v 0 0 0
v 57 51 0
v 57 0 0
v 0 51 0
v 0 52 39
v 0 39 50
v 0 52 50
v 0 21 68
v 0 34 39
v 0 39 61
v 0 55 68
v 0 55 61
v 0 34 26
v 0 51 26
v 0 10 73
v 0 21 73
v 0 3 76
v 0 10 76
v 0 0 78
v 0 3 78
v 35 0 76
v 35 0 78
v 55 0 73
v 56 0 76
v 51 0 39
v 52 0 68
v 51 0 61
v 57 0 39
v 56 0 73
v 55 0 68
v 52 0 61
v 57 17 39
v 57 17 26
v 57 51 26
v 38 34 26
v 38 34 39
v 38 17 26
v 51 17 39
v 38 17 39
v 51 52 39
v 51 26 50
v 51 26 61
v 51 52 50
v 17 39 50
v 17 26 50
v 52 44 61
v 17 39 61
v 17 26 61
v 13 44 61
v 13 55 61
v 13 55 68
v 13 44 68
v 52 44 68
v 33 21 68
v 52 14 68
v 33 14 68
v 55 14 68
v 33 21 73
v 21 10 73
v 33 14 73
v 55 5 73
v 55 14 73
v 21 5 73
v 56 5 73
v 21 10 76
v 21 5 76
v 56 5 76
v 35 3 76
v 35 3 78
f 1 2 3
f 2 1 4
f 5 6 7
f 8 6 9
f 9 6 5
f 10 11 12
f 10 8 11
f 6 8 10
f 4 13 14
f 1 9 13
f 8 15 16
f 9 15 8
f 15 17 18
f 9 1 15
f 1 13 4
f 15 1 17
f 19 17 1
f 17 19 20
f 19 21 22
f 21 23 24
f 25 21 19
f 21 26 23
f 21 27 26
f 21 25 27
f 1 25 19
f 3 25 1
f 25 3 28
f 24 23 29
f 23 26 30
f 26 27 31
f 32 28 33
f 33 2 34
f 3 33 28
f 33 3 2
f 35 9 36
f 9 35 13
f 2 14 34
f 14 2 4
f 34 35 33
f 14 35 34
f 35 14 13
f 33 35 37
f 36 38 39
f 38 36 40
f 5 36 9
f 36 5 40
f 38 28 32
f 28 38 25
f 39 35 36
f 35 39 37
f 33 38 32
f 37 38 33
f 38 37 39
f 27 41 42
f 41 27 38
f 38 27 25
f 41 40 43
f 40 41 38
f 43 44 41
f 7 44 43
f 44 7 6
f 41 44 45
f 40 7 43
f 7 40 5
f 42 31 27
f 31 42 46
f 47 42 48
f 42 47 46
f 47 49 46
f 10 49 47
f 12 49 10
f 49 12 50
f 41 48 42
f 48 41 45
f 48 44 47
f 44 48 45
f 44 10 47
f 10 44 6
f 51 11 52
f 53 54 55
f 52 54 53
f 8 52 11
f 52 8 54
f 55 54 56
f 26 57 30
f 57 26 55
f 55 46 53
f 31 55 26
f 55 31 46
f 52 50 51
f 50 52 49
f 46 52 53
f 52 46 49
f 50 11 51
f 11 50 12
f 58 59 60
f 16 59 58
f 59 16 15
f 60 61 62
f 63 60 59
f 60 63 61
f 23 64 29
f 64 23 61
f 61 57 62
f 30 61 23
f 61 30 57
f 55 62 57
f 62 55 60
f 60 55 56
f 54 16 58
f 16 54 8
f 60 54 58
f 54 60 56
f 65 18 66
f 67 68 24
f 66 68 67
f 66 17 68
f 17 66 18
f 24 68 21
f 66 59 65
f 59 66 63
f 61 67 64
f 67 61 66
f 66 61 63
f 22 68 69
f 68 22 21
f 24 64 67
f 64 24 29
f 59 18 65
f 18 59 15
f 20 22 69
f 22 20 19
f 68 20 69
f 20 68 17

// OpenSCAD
translate([9.5, 8.5, 6.5]) color([0.7783252161231047, 0.6735909267280185, 0.3798743247069636]) cube([19, 17, 13], center=true);
translate([28.5, 8.5, 6.5]) color([0.026441636821160075, 0.43626396781238774, 0.9136944836857255]) cube([19, 17, 13], center=true);
translate([47.5, 8.5, 6.5]) color([0.33292336546782575, 0.24795871915323087, 0.13783083382268813]) cube([19, 17, 13], center=true);
translate([9.5, 25.5, 6.5]) color([0.5102524550010475, 0.5333482727437294, 0.07304824240354912]) cube([19, 17, 13], center=true);
translate([28.5, 25.5, 6.5]) color([0.40775848601839615, 0.6586814548864428, 0.9660506851714608]) cube([19, 17, 13], center=true);
translate([47.5, 25.5, 6.5]) color([0.43154112171906467, 0.4360353368941353, 0.47113397256850664]) cube([19, 17, 13], center=true);
translate([9.5, 42.5, 6.5]) color([0.2250334912265638, 0.3948376420144343, 0.6452647259919572]) cube([19, 17, 13], center=true);
translate([28.5, 42.5, 6.5]) color([0.39705920905186254, 0.5813757484333044, 0.8355822879997544]) cube([19, 17, 13], center=true);
translate([47.5, 42.5, 6.5]) color([0.997967573075557, 0.8850396836294676, 0.3717966269131009]) cube([19, 17, 13], center=true);
translate([9.5, 8.5, 19.5]) color([0.02172713431740758, 0.6116045995026433, 0.4745507082101075]) cube([19, 17, 13], center=true);
translate([28.5, 8.5, 19.5]) color([0.23701711204858011, 0.040304099105049285, 0.3215702389727013]) cube([19, 17, 13], center=true);
translate([47.5, 8.5, 19.5]) color([0.7980713128356309, 0.9641190068878396, 0.10666013907247773]) cube([19, 17, 13], center=true);
translate([9.5, 25.5, 19.5]) color([0.8776394117814497, 0.04871767121707815, 0.7134758188756509]) cube([19, 17, 13], center=true);
translate([28.5, 25.5, 19.5]) color([0.026795713363172546, 0.4210496822819296, 0.8702308384812625]) cube([19, 17, 13], center=true);
translate([47.5, 25.5, 19.5]) color([0.39310814762828206, 0.9245643176497426, 0.7131951411119577]) cube([19, 17, 13], center=true);
translate([9.5, 42.5, 19.5]) color([0.6041842807977467, 0.16137904800183167, 0.34049578364460964]) cube([19, 17, 13], center=true);
translate([28.5, 42.5, 19.5]) color([0.4110961642787554, 0.5902048641324954, 0.9960381602092927]) cube([19, 17, 13], center=true);
translate([47.5, 42.5, 19.5]) color([0.2837097478049315, 0.5035628908314976, 0.9334479076287334]) cube([19, 17, 13], center=true);
translate([9.5, 8.5, 32.5]) color([0.3454207937620084, 0.6286047872723735, 0.7661315386941904]) cube([19, 17, 13], center=true);
translate([28.5, 8.5, 32.5]) color([0.6302697250151431, 0.7534306798421236, 0.19569300023569658]) cube([19, 17, 13], center=true);
translate([47.5, 8.5, 32.5]) color([0.9573376868488813, 0.17689780684900636, 0.583681176041597]) cube([19, 17, 13], center=true);
translate([9.5, 25.5, 32.5]) color([0.2960426090666165, 0.6344230252613314, 0.2911104153948655]) cube([19, 17, 13], center=true);
translate([28.5, 25.5, 32.5]) color([0.4312133568145403, 0.6822225482057551, 0.2690687505540429]) cube([19, 17, 13], center=true);
translate([8.5, 6.5, 44.5]) color([0.7278758824480682, 0.346877672777792, 0.1321560972206215]) cube([17, 13, 11], center=true);
translate([25.5, 6.5, 44.5]) color([0.613128716923026, 0.1657580288590924, 0.4305774463467016]) cube([17, 13, 11], center=true);
translate([42.5, 6.5, 44.5]) color([0.398397411879296, 0.07616884739618512, 0.7107698374020727]) cube([17, 13, 11], center=true);
translate([8.5, 19.5, 44.5]) color([0.6808235651092605, 0.7777950050341181, 0.5449131408796454]) cube([17, 13, 11], center=true);
translate([25.5, 19.5, 44.5]) color([0.5539167757205721, 0.1692330029082909, 0.2074638989900912]) cube([17, 13, 11], center=true);
translate([42.5, 19.5, 44.5]) color([0.22824949048252774, 0.5253035287227936, 0.8189825824874795]) cube([17, 13, 11], center=true);
translate([8.5, 32.5, 44.5]) color([0.3569741167117525, 0.881871988053252, 0.7358782685401997]) cube([17, 13, 11], center=true);
translate([25.5, 32.5, 44.5]) color([0.7164471432061884, 0.335172129304652, 0.11847749205352176]) cube([17, 13, 11], center=true);
translate([42.5, 32.5, 44.5]) color([0.962790481106405, 0.8546106356240183, 0.4088679907725796]) cube([17, 13, 11], center=true);
translate([8.5, 45.5, 44.5]) color([0.863218190236155, 0.8992171150320745, 0.34247362336498666]) cube([17, 13, 11], center=true);
translate([25.5, 45.5, 44.5]) color([0.5015614924470504, 0.331789840259637, 0.6951575140996313]) cube([17, 13, 11], center=true);
translate([42.5, 45.5, 44.5]) color([0.9121673135171753, 0.9845441038891614, 0.743779074814013]) cube([17, 13, 11], center=true);
translate([8.5, 6.5, 55.5]) color([0.30524235393506627, 0.8804932900877588, 0.9926196290445818]) cube([17, 13, 11], center=true);
translate([25.5, 6.5, 55.5]) color([0.3465261637439211, 0.9487123524492477, 0.5115464054506906]) cube([17, 13, 11], center=true);
translate([42.5, 6.5, 55.5]) color([0.9646354422725825, 0.9958559900991514, 0.8129420958288965]) cube([17, 13, 11], center=true);
translate([8.5, 19.5, 55.5]) color([0.683437049189351, 0.15401446929310414, 0.004917283233195846]) cube([17, 13, 11], center=true);
translate([25.5, 19.5, 55.5]) color([0.595470850423361, 0.7044599054830536, 0.9355380451790102]) cube([17, 13, 11], center=true);
translate([42.5, 19.5, 55.5]) color([0.5171199001879537, 0.6968466027027539, 0.6473559714710018]) cube([17, 13, 11], center=true);
translate([8.5, 32.5, 55.5]) color([0.2049201249762317, 0.6443000927800802, 0.9817212113250201]) cube([17, 13, 11], center=true);
translate([6.5, 5.5, 64.5]) color([0.11118495663016492, 0.6885432431989881, 0.6143051174926554]) cube([13, 11, 7], center=true);
translate([19.5, 5.5, 64.5]) color([0.3758547237916068, 0.7933477538527628, 0.01048585858492923]) cube([13, 11, 7], center=true);
translate([32.5, 5.5, 64.5]) color([0.8924116221231707, 0.8173639530127002, 0.4807048314687138]) cube([13, 11, 7], center=true);
translate([45.5, 5.5, 64.5]) color([0.10813915488104964, 0.45262855566363425, 0.584252899115387]) cube([13, 11, 7], center=true);
translate([6.5, 16.5, 64.5]) color([0.25388347854124227, 0.48653146484559573, 0.7757287638538752]) cube([13, 11, 7], center=true);
translate([19.5, 16.5, 64.5]) color([0.9227317956018974, 0.5616450276347316, 0.8272417850395823]) cube([13, 11, 7], center=true);
translate([32.5, 16.5, 64.5]) color([0.07793321296960098, 0.8563680463134653, 0.9208145654644209]) cube([13, 11, 7], center=true);
translate([45.5, 16.5, 64.5]) color([0.16800137628452116, 0.8274873617530726, 0.8495661703259881]) cube([13, 11, 7], center=true);
translate([6.5, 27.5, 64.5]) color([0.8786588683257629, 0.5171395198173923, 0.6082542438853435]) cube([13, 11, 7], center=true);
translate([19.5, 27.5, 64.5]) color([0.20808324544269907, 0.7081315493857046, 0.4050173034081427]) cube([13, 11, 7], center=true);
translate([32.5, 27.5, 64.5]) color([0.021169085707055446, 0.13426711350425513, 0.3882180316100641]) cube([13, 11, 7], center=true);
translate([45.5, 27.5, 64.5]) color([0.885179806060811, 0.5649422932688362, 0.916257034056247]) cube([13, 11, 7], center=true);
translate([6.5, 38.5, 64.5]) color([0.9294838443573096, 0.08679499211949981, 0.5882154137282689]) cube([13, 11, 7], center=true);
translate([19.5, 38.5, 64.5]) color([0.33452803815227405, 0.5067951222763686, 0.4555248024993094]) cube([13, 11, 7], center=true);
translate([32.5, 38.5, 64.5]) color([0.4799432726204613, 0.10180580816188334, 0.8331600837968306]) cube([13, 11, 7], center=true);
translate([45.5, 38.5, 64.5]) color([0.49027996175581356, 0.6449875562942834, 0.4726787527300935]) cube([13, 11, 7], center=true);
translate([6.5, 49.5, 64.5]) color([0.18101837657221131, 0.5410005849921866, 0.15953973906080132]) cube([13, 11, 7], center=true);
translate([5.5, 3.5, 70.5]) color([0.8521792561475834, 0.8316040256381448, 0.14363877815694315]) cube([11, 7, 5], center=true);
translate([16.5, 3.5, 70.5]) color([0.06884395303143254, 0.06849191694044987, 0.39324402485877463]) cube([11, 7, 5], center=true);
translate([27.5, 3.5, 70.5]) color([0.9530414373426318, 0.5561404160577164, 0.2655265739730889]) cube([11, 7, 5], center=true);
translate([38.5, 3.5, 70.5]) color([0.22964882712417878, 0.11087319475929203, 0.14107121049957605]) cube([11, 7, 5], center=true);
translate([49.5, 3.5, 70.5]) color([0.811863266633069, 0.1386334647121824, 0.8640615571790076]) cube([11, 7, 5], center=true);
translate([5.5, 10.5, 70.5]) color([0.8229980741854441, 0.1368088020868221, 0.5587247699387591]) cube([11, 7, 5], center=true);
translate([16.5, 10.5, 70.5]) color([0.007055267937954968, 0.8620361343350499, 0.5582771204396142]) cube([11, 7, 5], center=true);
translate([27.5, 10.5, 70.5]) color([0.7553403943905439, 0.49034532691625843, 0.6904219992983678]) cube([11, 7, 5], center=true);
translate([38.5, 10.5, 70.5]) color([0.9312391241860541, 0.5595458101278583, 0.874705476910058]) cube([11, 7, 5], center=true);
translate([49.5, 10.5, 70.5]) color([0.3430454423471212, 0.097532545668922, 0.0051446426040608895]) cube([11, 7, 5], center=true);
translate([5.5, 17.5, 70.5]) color([0.22665027899847212, 0.8385868369358646, 0.3114954626147214]) cube([11, 7, 5], center=true);
translate([16.5, 17.5, 70.5]) color([0.2246161476446097, 0.4956304233883704, 0.9469041224934578]) cube([11, 7, 5], center=true);
translate([27.5, 17.5, 70.5]) color([0.5089784482606999, 0.3408716625844388, 0.07750179100607058]) cube([11, 7, 5], center=true);
translate([3.5, 2.5, 74.5]) color([0.5736669333449989, 0.2262569795471856, 0.36749912771263804]) cube([7, 5, 3], center=true);
translate([10.5, 2.5, 74.5]) color([0.3811623667235057, 0.758184337209737, 0.2316288447968865]) cube([7, 5, 3], center=true);
translate([17.5, 2.5, 74.5]) color([0.9358922257968159, 0.7423880679625546, 0.4811195407808191]) cube([7, 5, 3], center=true);
translate([24.5, 2.5, 74.5]) color([0.8804744912800886, 0.3591679802752926, 0.3843398735852277]) cube([7, 5, 3], center=true);
translate([31.5, 2.5, 74.5]) color([0.1293691309627325, 0.7785560944636153, 0.4011926528443319]) cube([7, 5, 3], center=true);
translate([38.5, 2.5, 74.5]) color([0.500253028189022, 0.470968665396031, 0.6561818175710772]) cube([7, 5, 3], center=true);
translate([45.5, 2.5, 74.5]) color([0.3739384310853442, 0.9158613261487422, 0.43192225901344306]) cube([7, 5, 3], center=true);
translate([52.5, 2.5, 74.5]) color([0.3592139778487352, 0.40087805515024044, 0.7662957214889635]) cube([7, 5, 3], center=true);
translate([3.5, 7.5, 74.5]) color([0.9930565899841893, 0.8665146463013338, 0.47972749846874807]) cube([7, 5, 3], center=true);
translate([10.5, 7.5, 74.5]) color([0.29135934353342297, 0.44598705436487596, 0.34401555309356413]) cube([7, 5, 3], center=true);
translate([17.5, 7.5, 74.5]) color([0.24353205221386098, 0.1869409153584496, 0.955875734523651]) cube([7, 5, 3], center=true);
translate([2.5, 1.5, 77.0]) color([0.49930519035977794, 0.10997487367023018, 0.38390661012612914]) cube([5, 3, 2], center=true);
translate([7.5, 1.5, 77.0]) color([0.3887169172228757, 0.5135345269871933, 0.9800413246136939]) cube([5, 3, 2], center=true);
translate([12.5, 1.5, 77.0]) color([0.9766334965740477, 0.5658941107131482, 0.618091525291319]) cube([5, 3, 2], center=true);
translate([17.5, 1.5, 77.0]) color([0.6756290748662368, 0.5022221826851782, 0.48667805815232146]) cube([5, 3, 2], center=true);
translate([22.5, 1.5, 77.0]) color([0.3145239391767841, 0.6839217394712661, 0.0918952783328747]) cube([5, 3, 2], center=true);
translate([27.5, 1.5, 77.0]) color([0.31714524622461493, 0.8909785594776133, 0.22737815097545244]) cube([5, 3, 2], center=true);
translate([32.5, 1.5, 77.0]) color([0.9675823780249894, 0.9841697219657126, 0.5753826630962362]) cube([5, 3, 2], center=true);
